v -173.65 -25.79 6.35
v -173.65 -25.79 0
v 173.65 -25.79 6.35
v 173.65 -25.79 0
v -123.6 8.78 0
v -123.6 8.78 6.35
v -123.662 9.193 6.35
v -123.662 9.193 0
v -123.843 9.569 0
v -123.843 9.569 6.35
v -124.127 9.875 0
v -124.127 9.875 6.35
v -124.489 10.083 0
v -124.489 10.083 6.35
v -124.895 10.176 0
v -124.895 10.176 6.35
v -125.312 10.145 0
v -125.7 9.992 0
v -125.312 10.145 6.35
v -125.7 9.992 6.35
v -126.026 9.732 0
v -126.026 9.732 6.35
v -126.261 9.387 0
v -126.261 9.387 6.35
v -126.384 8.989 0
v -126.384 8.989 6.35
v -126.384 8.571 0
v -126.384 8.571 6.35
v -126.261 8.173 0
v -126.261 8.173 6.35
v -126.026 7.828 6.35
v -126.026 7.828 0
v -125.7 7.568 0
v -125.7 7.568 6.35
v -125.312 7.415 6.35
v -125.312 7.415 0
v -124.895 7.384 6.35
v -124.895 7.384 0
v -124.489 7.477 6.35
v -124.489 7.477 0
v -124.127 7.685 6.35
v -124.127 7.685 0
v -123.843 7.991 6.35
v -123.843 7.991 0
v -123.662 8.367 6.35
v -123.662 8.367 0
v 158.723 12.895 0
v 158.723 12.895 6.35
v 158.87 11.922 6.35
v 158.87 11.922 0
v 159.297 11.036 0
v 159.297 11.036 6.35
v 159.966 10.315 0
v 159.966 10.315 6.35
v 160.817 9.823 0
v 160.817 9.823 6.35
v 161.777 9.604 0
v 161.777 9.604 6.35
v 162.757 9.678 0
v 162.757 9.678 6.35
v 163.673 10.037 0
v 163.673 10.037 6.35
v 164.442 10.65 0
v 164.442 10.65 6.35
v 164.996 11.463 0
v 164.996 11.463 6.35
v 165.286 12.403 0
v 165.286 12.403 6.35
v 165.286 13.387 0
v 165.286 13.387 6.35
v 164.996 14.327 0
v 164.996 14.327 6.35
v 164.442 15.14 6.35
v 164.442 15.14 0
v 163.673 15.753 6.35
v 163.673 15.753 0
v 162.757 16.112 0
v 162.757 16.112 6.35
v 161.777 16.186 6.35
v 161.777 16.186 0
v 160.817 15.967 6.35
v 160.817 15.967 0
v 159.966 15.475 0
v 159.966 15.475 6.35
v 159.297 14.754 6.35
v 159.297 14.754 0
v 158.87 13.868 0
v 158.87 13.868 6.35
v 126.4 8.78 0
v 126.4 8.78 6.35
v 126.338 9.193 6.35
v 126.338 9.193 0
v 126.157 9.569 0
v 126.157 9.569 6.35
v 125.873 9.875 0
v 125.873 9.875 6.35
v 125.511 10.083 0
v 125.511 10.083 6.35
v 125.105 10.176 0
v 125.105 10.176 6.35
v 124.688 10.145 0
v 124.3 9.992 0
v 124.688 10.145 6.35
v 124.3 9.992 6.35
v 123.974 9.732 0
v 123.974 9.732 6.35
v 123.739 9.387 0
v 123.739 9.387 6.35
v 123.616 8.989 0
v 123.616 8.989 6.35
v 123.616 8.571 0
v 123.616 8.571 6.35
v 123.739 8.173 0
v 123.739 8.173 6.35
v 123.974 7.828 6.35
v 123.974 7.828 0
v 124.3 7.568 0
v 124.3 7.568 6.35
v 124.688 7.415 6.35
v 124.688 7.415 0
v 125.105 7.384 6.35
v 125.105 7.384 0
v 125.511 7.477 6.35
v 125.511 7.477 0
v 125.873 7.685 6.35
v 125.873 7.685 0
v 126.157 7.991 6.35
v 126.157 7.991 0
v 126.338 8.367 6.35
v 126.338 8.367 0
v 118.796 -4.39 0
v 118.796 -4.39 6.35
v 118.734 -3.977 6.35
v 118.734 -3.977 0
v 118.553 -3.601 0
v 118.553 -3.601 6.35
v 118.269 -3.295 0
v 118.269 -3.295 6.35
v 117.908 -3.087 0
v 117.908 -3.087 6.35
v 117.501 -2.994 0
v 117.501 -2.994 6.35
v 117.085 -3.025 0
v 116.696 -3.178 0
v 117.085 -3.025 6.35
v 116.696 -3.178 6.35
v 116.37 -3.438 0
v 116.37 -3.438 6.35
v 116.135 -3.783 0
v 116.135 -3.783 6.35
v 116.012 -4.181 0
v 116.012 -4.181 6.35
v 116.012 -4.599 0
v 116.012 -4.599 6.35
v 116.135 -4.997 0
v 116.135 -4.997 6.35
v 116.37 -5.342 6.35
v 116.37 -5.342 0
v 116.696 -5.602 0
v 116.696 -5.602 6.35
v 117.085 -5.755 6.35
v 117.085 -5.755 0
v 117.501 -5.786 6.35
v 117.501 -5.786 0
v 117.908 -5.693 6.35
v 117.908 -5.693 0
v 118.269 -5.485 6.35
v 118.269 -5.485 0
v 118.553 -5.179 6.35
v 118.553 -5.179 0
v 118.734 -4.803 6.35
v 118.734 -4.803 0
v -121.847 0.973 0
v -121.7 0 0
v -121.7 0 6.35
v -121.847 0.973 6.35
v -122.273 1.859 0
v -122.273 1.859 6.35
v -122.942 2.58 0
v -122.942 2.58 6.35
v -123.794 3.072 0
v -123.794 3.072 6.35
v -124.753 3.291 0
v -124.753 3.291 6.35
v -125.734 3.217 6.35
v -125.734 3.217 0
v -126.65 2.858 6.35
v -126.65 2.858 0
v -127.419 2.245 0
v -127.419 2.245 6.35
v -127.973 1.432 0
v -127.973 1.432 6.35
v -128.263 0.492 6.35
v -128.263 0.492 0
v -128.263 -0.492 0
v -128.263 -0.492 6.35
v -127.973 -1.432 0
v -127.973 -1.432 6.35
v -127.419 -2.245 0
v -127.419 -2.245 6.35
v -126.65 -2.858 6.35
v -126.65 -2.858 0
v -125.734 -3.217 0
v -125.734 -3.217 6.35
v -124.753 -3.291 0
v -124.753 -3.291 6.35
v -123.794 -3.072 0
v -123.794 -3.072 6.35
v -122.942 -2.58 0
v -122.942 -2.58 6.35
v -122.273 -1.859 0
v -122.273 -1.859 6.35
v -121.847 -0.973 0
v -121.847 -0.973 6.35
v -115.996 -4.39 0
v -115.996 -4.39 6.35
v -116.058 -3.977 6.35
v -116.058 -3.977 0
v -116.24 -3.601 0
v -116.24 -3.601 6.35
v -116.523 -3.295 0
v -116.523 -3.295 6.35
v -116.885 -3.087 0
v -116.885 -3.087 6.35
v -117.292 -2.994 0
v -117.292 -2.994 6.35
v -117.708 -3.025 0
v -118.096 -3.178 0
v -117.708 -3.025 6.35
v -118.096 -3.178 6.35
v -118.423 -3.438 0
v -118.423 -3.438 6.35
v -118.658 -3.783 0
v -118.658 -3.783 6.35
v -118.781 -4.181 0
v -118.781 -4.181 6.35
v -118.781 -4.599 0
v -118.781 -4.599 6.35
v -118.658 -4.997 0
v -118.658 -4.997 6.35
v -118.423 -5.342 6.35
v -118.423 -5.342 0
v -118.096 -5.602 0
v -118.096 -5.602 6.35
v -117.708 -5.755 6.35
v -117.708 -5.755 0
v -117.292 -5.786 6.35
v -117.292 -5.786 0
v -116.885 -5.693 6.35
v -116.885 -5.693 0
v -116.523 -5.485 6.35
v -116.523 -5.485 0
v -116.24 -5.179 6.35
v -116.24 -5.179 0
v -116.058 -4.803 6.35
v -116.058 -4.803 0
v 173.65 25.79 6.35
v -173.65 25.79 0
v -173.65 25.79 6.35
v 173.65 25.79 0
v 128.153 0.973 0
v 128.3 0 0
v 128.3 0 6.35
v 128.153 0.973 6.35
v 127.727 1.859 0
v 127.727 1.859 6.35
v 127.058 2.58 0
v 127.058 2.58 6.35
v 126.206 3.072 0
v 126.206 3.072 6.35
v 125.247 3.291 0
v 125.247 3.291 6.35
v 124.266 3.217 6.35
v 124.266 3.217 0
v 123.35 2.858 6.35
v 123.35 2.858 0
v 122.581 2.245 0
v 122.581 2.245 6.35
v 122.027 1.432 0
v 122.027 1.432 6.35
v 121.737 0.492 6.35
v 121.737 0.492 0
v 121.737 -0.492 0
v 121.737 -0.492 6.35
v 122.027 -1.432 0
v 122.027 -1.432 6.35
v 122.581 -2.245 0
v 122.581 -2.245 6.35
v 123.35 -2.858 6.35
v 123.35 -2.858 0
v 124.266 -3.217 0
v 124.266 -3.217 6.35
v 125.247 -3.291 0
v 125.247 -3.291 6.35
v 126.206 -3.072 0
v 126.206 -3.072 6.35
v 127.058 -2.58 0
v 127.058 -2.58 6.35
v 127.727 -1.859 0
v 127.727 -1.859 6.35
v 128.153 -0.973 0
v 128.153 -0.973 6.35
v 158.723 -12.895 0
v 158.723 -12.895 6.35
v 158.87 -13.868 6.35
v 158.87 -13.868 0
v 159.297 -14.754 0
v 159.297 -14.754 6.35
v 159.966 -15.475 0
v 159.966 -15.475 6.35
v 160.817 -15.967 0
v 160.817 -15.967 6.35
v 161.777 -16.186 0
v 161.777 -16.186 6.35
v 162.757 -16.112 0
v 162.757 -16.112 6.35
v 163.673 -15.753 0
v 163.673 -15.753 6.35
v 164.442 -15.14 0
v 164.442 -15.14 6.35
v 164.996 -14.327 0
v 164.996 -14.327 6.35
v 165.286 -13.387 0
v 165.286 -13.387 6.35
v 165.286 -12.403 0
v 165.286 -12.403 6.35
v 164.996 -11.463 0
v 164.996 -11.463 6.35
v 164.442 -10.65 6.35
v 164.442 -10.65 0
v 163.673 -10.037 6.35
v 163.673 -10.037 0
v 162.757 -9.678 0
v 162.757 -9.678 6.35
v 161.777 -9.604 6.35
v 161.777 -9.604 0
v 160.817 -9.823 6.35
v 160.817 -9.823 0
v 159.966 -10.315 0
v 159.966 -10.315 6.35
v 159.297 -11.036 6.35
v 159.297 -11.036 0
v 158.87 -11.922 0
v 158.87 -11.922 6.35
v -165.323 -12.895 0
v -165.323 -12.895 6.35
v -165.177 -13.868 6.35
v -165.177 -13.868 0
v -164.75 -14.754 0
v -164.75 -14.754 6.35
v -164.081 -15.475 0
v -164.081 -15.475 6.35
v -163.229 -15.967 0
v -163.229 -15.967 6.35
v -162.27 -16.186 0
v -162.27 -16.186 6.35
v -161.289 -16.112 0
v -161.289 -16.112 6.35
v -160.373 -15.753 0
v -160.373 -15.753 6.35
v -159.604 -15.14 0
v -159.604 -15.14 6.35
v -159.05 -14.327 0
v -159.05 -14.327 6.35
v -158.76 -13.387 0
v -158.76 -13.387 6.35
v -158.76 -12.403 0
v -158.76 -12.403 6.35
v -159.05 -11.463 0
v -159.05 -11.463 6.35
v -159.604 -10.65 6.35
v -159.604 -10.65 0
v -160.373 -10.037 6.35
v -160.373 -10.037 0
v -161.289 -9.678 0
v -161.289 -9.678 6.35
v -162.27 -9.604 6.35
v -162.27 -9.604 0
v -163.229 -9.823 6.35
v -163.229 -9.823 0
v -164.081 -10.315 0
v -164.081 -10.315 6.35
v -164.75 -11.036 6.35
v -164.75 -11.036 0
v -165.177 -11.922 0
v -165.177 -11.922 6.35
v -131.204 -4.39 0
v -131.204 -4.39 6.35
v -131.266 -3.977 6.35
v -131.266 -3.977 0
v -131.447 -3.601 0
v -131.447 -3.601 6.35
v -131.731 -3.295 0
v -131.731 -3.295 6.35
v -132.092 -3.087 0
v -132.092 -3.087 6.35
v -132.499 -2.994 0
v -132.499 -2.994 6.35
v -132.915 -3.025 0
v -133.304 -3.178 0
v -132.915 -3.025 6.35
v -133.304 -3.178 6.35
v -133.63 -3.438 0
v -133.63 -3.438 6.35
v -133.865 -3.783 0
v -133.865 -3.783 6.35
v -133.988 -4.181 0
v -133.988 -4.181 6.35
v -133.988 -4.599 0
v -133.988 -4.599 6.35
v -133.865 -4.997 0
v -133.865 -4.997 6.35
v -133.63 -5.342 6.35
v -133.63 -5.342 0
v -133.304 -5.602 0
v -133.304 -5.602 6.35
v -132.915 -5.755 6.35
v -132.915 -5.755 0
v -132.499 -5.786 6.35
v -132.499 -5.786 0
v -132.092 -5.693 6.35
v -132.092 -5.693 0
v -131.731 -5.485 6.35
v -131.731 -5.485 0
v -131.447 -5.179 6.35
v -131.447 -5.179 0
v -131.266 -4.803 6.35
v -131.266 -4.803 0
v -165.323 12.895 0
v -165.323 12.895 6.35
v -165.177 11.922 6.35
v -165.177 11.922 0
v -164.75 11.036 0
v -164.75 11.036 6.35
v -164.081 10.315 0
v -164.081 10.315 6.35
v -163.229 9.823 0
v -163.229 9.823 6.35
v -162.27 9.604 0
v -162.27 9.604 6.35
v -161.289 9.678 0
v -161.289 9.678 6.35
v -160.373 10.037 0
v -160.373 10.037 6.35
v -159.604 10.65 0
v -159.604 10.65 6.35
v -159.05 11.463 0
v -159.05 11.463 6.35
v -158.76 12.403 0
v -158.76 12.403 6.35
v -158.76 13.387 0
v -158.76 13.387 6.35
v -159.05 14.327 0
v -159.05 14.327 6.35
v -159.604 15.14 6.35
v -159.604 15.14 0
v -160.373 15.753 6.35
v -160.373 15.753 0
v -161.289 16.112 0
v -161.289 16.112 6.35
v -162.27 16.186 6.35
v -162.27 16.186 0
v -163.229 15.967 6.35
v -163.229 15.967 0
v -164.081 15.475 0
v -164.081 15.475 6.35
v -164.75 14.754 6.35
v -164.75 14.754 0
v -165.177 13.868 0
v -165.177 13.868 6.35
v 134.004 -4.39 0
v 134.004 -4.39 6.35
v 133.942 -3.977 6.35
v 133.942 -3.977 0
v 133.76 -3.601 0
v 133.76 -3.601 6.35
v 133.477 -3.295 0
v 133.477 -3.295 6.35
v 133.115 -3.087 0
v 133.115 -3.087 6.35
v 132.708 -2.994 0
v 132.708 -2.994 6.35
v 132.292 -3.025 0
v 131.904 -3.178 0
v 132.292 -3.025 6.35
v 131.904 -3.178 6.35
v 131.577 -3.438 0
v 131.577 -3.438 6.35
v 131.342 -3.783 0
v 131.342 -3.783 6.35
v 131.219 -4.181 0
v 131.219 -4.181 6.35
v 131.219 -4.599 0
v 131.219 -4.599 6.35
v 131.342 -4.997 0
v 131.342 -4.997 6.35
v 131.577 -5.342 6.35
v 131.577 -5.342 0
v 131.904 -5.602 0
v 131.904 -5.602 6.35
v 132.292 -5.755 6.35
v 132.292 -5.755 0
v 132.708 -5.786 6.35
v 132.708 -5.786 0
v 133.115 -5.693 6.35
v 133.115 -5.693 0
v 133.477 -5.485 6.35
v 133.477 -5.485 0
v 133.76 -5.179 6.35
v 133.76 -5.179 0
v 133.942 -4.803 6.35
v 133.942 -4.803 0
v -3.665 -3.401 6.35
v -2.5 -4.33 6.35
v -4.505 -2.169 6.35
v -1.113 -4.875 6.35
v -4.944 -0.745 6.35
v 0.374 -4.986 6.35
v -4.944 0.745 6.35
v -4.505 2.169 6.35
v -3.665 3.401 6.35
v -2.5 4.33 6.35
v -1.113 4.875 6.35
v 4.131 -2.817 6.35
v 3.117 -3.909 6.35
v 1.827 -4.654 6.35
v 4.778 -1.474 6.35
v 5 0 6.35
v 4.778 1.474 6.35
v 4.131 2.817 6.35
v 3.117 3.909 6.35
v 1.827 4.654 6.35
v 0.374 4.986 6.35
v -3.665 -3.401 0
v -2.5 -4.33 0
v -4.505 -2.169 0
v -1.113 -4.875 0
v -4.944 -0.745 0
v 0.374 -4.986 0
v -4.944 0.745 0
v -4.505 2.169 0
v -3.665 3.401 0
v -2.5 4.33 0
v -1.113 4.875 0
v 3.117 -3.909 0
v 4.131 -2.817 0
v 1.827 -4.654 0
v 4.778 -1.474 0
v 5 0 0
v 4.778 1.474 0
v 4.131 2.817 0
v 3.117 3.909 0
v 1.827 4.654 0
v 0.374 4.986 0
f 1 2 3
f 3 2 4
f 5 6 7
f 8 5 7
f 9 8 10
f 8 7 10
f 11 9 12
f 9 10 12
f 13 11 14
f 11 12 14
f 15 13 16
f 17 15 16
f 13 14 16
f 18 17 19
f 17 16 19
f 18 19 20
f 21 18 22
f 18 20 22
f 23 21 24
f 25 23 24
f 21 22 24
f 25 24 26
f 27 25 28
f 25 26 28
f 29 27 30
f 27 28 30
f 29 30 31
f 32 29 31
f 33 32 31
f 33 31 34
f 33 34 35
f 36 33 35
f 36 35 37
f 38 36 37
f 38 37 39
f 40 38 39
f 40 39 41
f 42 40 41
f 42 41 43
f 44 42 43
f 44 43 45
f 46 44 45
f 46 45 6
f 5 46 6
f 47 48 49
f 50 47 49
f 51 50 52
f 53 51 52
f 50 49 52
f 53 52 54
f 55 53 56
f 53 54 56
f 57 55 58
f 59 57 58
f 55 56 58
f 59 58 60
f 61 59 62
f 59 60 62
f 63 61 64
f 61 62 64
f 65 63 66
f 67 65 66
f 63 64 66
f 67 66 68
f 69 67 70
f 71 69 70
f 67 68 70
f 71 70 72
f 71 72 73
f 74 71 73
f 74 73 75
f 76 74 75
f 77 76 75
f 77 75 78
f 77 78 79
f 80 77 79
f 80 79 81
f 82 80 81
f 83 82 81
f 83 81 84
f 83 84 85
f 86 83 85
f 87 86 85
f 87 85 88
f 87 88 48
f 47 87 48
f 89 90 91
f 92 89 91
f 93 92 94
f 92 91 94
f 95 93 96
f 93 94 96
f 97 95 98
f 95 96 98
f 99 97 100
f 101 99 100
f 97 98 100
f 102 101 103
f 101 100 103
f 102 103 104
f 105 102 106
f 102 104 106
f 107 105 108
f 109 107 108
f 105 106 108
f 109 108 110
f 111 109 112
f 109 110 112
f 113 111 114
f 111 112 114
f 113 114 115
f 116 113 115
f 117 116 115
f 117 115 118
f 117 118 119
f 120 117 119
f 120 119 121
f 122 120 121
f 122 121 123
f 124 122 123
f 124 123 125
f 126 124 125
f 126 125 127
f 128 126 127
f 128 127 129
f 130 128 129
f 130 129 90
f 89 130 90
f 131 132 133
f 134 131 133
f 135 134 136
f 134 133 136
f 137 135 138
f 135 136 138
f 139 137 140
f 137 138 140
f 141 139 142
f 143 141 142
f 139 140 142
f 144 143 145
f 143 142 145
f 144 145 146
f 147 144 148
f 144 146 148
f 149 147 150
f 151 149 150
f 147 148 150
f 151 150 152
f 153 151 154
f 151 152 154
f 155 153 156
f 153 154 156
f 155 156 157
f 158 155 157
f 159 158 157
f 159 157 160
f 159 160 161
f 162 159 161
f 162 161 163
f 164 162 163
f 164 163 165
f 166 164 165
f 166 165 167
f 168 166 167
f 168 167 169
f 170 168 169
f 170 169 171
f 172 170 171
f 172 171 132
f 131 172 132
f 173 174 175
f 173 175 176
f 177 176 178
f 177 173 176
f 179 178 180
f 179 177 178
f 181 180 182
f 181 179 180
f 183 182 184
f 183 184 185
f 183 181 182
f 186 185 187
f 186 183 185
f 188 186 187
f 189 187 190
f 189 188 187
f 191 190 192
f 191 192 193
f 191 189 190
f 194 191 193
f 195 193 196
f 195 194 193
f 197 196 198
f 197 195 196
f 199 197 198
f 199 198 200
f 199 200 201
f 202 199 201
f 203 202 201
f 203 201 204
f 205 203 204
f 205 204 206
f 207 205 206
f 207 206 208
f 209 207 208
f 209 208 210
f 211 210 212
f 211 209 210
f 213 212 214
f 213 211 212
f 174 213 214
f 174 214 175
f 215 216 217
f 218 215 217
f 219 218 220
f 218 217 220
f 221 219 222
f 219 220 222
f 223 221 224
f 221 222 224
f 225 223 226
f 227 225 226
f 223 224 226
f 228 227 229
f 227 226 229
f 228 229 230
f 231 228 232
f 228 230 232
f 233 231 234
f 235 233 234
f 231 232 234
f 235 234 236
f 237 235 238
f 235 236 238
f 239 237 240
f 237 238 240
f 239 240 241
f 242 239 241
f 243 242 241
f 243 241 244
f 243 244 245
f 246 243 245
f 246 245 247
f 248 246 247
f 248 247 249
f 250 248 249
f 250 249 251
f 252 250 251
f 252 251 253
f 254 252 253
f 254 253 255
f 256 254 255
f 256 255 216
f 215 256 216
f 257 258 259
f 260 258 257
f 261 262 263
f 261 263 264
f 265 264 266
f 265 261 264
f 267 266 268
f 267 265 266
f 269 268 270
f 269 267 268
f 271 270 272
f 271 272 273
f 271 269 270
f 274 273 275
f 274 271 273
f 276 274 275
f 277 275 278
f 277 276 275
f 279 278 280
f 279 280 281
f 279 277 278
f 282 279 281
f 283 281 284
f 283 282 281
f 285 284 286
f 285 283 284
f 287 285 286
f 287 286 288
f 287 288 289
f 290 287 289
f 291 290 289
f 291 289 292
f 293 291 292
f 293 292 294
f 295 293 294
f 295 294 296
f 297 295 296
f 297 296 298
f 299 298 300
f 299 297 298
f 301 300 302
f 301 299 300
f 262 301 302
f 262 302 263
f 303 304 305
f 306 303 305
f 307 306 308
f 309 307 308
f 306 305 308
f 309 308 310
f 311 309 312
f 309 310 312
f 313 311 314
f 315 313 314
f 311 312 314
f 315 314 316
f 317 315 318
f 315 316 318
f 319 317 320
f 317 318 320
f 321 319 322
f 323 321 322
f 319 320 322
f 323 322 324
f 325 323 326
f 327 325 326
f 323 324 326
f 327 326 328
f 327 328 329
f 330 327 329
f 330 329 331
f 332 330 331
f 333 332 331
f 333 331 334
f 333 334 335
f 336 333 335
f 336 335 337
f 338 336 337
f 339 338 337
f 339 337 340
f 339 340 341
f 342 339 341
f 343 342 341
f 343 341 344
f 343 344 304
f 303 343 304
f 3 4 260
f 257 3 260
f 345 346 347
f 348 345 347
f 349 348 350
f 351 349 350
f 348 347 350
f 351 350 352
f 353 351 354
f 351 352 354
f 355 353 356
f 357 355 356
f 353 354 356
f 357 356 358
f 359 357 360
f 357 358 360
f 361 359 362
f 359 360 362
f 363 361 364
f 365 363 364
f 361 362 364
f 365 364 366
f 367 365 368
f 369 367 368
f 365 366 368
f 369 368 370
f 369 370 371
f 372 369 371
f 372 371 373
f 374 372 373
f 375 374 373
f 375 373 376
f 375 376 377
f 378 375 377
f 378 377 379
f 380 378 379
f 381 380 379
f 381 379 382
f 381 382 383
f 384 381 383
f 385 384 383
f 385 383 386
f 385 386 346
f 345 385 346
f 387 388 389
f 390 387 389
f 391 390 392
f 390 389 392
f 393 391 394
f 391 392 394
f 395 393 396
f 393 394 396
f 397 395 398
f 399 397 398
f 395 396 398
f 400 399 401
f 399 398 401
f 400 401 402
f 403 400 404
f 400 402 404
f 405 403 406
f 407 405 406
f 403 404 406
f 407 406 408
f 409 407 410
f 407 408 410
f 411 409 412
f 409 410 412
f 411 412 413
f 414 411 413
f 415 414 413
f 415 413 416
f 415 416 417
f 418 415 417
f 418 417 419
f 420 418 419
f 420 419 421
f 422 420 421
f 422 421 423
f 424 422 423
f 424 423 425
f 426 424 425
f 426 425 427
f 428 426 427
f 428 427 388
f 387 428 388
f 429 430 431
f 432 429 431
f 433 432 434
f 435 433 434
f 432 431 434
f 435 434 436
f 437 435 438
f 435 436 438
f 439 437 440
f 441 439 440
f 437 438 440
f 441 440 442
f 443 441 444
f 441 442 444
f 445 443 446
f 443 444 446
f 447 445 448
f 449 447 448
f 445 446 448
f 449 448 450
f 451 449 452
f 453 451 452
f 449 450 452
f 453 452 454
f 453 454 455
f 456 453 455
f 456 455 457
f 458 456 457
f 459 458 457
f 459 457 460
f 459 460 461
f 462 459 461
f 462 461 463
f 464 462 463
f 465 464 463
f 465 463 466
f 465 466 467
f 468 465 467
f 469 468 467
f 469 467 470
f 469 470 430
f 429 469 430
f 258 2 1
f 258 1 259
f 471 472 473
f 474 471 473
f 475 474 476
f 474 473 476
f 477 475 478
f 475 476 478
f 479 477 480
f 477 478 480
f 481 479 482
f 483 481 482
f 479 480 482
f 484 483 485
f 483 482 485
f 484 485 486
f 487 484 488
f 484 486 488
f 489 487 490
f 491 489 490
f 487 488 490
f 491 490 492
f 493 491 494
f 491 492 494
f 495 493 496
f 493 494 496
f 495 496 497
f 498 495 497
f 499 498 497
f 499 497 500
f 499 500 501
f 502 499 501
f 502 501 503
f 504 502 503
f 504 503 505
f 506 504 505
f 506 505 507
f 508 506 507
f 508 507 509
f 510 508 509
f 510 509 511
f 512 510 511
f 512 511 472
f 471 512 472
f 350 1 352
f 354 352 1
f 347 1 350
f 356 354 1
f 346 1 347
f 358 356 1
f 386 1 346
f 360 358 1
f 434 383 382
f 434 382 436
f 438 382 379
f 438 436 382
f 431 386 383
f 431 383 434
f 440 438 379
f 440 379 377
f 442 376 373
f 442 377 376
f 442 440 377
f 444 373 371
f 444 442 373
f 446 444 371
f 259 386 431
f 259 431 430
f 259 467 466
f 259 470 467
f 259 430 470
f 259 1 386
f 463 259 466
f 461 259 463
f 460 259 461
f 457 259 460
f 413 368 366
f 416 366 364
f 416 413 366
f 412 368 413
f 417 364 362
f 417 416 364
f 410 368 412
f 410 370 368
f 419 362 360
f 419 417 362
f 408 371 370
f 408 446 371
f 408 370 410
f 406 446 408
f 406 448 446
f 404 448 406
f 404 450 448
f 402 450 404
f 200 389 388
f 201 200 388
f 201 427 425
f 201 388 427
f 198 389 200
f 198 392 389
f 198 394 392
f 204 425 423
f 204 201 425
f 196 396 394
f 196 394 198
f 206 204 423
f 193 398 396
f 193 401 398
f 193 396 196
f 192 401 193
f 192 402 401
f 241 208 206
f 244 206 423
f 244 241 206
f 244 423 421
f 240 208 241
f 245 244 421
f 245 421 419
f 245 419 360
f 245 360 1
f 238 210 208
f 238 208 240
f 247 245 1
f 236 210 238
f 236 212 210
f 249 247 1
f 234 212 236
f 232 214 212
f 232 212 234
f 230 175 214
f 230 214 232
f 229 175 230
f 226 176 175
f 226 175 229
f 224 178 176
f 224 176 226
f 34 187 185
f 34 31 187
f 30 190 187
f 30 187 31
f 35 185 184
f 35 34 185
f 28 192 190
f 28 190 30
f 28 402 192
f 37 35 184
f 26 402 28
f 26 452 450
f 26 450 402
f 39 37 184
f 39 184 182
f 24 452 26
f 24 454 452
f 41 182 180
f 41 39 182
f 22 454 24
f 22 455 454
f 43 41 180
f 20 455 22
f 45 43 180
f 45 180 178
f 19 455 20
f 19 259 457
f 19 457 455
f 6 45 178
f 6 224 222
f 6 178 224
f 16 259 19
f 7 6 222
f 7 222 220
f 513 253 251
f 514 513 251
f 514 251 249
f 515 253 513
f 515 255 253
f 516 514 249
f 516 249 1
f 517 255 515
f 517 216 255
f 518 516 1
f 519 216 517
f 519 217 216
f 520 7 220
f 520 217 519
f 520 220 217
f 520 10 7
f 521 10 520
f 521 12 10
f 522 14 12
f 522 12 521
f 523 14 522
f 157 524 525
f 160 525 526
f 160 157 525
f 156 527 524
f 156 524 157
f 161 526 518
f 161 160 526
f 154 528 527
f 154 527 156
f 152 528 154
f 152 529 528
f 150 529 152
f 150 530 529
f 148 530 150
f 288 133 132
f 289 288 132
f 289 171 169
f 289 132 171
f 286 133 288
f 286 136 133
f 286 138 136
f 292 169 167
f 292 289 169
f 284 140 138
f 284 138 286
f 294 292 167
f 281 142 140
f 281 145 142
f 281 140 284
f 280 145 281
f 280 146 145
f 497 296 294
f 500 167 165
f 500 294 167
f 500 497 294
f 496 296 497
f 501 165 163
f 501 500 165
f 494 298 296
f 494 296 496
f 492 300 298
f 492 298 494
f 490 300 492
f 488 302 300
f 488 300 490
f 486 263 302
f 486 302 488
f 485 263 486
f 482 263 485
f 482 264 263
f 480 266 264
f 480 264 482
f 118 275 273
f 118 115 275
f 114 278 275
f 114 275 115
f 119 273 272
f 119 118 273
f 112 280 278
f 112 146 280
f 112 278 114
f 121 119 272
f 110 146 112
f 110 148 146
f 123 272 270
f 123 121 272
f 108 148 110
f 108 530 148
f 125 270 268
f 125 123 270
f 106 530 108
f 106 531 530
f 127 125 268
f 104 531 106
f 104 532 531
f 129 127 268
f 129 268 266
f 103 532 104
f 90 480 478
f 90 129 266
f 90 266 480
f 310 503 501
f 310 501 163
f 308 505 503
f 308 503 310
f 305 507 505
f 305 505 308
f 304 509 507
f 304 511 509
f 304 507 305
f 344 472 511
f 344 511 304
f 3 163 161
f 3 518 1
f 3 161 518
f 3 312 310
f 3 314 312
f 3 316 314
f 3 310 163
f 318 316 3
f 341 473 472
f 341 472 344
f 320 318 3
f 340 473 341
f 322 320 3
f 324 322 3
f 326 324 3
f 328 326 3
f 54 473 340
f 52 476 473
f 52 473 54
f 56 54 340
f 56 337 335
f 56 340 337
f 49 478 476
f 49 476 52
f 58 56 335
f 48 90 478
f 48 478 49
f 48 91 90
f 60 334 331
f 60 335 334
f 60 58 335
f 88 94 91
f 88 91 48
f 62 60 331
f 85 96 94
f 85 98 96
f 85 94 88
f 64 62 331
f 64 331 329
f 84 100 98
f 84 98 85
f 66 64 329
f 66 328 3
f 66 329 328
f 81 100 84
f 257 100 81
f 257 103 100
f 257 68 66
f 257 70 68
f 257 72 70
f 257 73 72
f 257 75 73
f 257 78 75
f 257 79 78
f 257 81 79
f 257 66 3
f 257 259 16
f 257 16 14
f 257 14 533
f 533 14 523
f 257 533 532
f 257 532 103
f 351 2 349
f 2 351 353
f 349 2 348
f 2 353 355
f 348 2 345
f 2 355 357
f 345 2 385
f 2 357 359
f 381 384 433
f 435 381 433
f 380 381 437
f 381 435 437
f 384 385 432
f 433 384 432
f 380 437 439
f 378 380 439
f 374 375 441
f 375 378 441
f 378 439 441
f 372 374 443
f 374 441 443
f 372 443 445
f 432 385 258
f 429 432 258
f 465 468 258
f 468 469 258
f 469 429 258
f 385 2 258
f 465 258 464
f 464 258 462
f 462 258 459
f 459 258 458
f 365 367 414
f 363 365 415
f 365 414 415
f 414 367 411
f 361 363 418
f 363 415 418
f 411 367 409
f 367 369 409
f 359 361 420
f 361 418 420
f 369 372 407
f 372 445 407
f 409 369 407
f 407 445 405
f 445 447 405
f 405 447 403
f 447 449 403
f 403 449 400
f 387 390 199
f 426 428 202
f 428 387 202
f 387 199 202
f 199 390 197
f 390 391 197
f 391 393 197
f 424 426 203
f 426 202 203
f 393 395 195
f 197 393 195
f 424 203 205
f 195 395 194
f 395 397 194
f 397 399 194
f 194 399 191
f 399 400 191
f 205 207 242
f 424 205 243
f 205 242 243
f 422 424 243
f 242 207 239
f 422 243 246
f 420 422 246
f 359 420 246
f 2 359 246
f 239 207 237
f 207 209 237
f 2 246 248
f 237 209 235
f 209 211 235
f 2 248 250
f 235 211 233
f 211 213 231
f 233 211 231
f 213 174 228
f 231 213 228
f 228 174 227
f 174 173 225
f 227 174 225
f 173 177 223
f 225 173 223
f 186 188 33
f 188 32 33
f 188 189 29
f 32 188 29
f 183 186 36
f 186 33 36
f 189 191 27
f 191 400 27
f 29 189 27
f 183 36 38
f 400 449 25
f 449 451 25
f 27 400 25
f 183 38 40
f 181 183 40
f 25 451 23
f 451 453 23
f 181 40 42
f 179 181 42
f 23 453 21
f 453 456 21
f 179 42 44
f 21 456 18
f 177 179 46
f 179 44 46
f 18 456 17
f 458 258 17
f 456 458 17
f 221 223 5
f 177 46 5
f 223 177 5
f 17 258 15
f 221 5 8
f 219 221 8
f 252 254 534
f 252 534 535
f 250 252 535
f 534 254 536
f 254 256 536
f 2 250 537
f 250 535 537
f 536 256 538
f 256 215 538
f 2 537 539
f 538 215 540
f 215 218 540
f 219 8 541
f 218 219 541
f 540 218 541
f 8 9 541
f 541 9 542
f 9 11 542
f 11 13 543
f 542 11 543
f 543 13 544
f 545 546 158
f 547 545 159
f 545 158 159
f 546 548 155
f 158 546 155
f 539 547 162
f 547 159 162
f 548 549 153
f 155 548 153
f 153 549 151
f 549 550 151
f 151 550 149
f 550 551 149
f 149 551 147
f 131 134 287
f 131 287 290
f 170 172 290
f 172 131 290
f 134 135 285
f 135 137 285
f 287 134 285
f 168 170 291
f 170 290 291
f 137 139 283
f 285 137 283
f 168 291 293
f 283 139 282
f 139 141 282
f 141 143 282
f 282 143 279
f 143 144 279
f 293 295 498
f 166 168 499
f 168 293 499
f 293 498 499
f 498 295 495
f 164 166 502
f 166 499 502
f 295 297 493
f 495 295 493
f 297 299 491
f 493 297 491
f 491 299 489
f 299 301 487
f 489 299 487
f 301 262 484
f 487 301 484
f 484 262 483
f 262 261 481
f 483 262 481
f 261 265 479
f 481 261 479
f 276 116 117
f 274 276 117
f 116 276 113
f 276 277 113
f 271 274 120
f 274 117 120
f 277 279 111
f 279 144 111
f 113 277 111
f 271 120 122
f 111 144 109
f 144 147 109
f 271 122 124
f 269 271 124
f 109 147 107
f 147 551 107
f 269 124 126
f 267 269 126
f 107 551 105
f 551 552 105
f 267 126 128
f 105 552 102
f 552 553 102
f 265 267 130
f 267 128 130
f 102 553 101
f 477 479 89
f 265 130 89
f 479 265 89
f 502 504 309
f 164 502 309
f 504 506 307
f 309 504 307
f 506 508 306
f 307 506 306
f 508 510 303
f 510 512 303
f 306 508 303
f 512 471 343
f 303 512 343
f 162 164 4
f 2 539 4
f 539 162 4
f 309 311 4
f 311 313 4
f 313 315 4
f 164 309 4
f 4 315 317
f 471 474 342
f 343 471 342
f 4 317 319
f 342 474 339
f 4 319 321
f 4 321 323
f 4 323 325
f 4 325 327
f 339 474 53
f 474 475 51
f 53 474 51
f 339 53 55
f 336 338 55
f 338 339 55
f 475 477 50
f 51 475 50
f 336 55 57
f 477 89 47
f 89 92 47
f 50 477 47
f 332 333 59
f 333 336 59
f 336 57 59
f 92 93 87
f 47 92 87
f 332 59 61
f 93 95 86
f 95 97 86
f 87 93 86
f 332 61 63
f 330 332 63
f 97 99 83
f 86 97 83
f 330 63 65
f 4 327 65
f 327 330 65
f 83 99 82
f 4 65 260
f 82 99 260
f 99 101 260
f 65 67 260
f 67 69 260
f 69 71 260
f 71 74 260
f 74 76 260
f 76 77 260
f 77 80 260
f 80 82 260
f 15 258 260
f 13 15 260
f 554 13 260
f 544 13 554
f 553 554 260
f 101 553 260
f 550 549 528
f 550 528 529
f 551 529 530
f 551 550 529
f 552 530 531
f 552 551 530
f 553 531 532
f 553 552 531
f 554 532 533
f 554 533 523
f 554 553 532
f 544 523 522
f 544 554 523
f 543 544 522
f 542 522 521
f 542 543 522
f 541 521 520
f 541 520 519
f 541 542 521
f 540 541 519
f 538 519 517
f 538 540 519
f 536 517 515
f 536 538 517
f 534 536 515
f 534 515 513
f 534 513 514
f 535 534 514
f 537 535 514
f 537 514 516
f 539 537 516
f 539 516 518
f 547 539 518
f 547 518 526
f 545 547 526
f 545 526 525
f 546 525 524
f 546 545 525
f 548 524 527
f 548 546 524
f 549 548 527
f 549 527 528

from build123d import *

# Parameters (mm, degrees)
F0_W     = 347.3
F0_H     = 51.58
F0_R     = 3.3
F0_R_2   = 5
F1_DEPTH = 6.35
F3_D     = 6.6
F4_R     = 1.4
F5_DEPTH = 6.351


# Not quite as in the source:
# - a feature names something its author has since deleted; it is built from what else it names


with BuildPart() as f1:
    # F0 (on Top) → F1 (new body)
    with BuildSketch(Plane.XY):
        Rectangle(F0_W, F0_H)
        with Locations((-125, 0)):
            Circle(F0_R, mode=Mode.SUBTRACT)
        Circle(F0_R_2, mode=Mode.SUBTRACT)
        with Locations((125, 0)):
            Circle(F0_R, mode=Mode.SUBTRACT)
    extrude(amount=F1_DEPTH)

    # F3 (through all)
    with Locations(Plane(origin=(0, 0, 0), x_dir=(1, 0, 0), z_dir=(0, 0, -1))):
        with Locations((-162.023125, 12.895), (-162.023125, -12.895), (162.023125, -12.895), (162.023125, 12.895)):
            Hole(F3_D / 2)

    # F4 (on face) → F5 (cut, through all)
    with BuildSketch(Plane.XY.offset(6.35)):
        with Locations((-125, 8.78)):
            Circle(F4_R)
        with Locations((-132.6037030452, -4.39)):
            Circle(F4_R)
        with Locations((-117.3962969548, -4.39)):
            Circle(F4_R)
        with Locations((125, 8.78)):
            Circle(F4_R)
        with Locations((132.6037030452, -4.39)):
            Circle(F4_R)
        with Locations((117.3962969548, -4.39)):
            Circle(F4_R)
    extrude(amount=-F5_DEPTH, mode=Mode.SUBTRACT)


solid = f1.part
